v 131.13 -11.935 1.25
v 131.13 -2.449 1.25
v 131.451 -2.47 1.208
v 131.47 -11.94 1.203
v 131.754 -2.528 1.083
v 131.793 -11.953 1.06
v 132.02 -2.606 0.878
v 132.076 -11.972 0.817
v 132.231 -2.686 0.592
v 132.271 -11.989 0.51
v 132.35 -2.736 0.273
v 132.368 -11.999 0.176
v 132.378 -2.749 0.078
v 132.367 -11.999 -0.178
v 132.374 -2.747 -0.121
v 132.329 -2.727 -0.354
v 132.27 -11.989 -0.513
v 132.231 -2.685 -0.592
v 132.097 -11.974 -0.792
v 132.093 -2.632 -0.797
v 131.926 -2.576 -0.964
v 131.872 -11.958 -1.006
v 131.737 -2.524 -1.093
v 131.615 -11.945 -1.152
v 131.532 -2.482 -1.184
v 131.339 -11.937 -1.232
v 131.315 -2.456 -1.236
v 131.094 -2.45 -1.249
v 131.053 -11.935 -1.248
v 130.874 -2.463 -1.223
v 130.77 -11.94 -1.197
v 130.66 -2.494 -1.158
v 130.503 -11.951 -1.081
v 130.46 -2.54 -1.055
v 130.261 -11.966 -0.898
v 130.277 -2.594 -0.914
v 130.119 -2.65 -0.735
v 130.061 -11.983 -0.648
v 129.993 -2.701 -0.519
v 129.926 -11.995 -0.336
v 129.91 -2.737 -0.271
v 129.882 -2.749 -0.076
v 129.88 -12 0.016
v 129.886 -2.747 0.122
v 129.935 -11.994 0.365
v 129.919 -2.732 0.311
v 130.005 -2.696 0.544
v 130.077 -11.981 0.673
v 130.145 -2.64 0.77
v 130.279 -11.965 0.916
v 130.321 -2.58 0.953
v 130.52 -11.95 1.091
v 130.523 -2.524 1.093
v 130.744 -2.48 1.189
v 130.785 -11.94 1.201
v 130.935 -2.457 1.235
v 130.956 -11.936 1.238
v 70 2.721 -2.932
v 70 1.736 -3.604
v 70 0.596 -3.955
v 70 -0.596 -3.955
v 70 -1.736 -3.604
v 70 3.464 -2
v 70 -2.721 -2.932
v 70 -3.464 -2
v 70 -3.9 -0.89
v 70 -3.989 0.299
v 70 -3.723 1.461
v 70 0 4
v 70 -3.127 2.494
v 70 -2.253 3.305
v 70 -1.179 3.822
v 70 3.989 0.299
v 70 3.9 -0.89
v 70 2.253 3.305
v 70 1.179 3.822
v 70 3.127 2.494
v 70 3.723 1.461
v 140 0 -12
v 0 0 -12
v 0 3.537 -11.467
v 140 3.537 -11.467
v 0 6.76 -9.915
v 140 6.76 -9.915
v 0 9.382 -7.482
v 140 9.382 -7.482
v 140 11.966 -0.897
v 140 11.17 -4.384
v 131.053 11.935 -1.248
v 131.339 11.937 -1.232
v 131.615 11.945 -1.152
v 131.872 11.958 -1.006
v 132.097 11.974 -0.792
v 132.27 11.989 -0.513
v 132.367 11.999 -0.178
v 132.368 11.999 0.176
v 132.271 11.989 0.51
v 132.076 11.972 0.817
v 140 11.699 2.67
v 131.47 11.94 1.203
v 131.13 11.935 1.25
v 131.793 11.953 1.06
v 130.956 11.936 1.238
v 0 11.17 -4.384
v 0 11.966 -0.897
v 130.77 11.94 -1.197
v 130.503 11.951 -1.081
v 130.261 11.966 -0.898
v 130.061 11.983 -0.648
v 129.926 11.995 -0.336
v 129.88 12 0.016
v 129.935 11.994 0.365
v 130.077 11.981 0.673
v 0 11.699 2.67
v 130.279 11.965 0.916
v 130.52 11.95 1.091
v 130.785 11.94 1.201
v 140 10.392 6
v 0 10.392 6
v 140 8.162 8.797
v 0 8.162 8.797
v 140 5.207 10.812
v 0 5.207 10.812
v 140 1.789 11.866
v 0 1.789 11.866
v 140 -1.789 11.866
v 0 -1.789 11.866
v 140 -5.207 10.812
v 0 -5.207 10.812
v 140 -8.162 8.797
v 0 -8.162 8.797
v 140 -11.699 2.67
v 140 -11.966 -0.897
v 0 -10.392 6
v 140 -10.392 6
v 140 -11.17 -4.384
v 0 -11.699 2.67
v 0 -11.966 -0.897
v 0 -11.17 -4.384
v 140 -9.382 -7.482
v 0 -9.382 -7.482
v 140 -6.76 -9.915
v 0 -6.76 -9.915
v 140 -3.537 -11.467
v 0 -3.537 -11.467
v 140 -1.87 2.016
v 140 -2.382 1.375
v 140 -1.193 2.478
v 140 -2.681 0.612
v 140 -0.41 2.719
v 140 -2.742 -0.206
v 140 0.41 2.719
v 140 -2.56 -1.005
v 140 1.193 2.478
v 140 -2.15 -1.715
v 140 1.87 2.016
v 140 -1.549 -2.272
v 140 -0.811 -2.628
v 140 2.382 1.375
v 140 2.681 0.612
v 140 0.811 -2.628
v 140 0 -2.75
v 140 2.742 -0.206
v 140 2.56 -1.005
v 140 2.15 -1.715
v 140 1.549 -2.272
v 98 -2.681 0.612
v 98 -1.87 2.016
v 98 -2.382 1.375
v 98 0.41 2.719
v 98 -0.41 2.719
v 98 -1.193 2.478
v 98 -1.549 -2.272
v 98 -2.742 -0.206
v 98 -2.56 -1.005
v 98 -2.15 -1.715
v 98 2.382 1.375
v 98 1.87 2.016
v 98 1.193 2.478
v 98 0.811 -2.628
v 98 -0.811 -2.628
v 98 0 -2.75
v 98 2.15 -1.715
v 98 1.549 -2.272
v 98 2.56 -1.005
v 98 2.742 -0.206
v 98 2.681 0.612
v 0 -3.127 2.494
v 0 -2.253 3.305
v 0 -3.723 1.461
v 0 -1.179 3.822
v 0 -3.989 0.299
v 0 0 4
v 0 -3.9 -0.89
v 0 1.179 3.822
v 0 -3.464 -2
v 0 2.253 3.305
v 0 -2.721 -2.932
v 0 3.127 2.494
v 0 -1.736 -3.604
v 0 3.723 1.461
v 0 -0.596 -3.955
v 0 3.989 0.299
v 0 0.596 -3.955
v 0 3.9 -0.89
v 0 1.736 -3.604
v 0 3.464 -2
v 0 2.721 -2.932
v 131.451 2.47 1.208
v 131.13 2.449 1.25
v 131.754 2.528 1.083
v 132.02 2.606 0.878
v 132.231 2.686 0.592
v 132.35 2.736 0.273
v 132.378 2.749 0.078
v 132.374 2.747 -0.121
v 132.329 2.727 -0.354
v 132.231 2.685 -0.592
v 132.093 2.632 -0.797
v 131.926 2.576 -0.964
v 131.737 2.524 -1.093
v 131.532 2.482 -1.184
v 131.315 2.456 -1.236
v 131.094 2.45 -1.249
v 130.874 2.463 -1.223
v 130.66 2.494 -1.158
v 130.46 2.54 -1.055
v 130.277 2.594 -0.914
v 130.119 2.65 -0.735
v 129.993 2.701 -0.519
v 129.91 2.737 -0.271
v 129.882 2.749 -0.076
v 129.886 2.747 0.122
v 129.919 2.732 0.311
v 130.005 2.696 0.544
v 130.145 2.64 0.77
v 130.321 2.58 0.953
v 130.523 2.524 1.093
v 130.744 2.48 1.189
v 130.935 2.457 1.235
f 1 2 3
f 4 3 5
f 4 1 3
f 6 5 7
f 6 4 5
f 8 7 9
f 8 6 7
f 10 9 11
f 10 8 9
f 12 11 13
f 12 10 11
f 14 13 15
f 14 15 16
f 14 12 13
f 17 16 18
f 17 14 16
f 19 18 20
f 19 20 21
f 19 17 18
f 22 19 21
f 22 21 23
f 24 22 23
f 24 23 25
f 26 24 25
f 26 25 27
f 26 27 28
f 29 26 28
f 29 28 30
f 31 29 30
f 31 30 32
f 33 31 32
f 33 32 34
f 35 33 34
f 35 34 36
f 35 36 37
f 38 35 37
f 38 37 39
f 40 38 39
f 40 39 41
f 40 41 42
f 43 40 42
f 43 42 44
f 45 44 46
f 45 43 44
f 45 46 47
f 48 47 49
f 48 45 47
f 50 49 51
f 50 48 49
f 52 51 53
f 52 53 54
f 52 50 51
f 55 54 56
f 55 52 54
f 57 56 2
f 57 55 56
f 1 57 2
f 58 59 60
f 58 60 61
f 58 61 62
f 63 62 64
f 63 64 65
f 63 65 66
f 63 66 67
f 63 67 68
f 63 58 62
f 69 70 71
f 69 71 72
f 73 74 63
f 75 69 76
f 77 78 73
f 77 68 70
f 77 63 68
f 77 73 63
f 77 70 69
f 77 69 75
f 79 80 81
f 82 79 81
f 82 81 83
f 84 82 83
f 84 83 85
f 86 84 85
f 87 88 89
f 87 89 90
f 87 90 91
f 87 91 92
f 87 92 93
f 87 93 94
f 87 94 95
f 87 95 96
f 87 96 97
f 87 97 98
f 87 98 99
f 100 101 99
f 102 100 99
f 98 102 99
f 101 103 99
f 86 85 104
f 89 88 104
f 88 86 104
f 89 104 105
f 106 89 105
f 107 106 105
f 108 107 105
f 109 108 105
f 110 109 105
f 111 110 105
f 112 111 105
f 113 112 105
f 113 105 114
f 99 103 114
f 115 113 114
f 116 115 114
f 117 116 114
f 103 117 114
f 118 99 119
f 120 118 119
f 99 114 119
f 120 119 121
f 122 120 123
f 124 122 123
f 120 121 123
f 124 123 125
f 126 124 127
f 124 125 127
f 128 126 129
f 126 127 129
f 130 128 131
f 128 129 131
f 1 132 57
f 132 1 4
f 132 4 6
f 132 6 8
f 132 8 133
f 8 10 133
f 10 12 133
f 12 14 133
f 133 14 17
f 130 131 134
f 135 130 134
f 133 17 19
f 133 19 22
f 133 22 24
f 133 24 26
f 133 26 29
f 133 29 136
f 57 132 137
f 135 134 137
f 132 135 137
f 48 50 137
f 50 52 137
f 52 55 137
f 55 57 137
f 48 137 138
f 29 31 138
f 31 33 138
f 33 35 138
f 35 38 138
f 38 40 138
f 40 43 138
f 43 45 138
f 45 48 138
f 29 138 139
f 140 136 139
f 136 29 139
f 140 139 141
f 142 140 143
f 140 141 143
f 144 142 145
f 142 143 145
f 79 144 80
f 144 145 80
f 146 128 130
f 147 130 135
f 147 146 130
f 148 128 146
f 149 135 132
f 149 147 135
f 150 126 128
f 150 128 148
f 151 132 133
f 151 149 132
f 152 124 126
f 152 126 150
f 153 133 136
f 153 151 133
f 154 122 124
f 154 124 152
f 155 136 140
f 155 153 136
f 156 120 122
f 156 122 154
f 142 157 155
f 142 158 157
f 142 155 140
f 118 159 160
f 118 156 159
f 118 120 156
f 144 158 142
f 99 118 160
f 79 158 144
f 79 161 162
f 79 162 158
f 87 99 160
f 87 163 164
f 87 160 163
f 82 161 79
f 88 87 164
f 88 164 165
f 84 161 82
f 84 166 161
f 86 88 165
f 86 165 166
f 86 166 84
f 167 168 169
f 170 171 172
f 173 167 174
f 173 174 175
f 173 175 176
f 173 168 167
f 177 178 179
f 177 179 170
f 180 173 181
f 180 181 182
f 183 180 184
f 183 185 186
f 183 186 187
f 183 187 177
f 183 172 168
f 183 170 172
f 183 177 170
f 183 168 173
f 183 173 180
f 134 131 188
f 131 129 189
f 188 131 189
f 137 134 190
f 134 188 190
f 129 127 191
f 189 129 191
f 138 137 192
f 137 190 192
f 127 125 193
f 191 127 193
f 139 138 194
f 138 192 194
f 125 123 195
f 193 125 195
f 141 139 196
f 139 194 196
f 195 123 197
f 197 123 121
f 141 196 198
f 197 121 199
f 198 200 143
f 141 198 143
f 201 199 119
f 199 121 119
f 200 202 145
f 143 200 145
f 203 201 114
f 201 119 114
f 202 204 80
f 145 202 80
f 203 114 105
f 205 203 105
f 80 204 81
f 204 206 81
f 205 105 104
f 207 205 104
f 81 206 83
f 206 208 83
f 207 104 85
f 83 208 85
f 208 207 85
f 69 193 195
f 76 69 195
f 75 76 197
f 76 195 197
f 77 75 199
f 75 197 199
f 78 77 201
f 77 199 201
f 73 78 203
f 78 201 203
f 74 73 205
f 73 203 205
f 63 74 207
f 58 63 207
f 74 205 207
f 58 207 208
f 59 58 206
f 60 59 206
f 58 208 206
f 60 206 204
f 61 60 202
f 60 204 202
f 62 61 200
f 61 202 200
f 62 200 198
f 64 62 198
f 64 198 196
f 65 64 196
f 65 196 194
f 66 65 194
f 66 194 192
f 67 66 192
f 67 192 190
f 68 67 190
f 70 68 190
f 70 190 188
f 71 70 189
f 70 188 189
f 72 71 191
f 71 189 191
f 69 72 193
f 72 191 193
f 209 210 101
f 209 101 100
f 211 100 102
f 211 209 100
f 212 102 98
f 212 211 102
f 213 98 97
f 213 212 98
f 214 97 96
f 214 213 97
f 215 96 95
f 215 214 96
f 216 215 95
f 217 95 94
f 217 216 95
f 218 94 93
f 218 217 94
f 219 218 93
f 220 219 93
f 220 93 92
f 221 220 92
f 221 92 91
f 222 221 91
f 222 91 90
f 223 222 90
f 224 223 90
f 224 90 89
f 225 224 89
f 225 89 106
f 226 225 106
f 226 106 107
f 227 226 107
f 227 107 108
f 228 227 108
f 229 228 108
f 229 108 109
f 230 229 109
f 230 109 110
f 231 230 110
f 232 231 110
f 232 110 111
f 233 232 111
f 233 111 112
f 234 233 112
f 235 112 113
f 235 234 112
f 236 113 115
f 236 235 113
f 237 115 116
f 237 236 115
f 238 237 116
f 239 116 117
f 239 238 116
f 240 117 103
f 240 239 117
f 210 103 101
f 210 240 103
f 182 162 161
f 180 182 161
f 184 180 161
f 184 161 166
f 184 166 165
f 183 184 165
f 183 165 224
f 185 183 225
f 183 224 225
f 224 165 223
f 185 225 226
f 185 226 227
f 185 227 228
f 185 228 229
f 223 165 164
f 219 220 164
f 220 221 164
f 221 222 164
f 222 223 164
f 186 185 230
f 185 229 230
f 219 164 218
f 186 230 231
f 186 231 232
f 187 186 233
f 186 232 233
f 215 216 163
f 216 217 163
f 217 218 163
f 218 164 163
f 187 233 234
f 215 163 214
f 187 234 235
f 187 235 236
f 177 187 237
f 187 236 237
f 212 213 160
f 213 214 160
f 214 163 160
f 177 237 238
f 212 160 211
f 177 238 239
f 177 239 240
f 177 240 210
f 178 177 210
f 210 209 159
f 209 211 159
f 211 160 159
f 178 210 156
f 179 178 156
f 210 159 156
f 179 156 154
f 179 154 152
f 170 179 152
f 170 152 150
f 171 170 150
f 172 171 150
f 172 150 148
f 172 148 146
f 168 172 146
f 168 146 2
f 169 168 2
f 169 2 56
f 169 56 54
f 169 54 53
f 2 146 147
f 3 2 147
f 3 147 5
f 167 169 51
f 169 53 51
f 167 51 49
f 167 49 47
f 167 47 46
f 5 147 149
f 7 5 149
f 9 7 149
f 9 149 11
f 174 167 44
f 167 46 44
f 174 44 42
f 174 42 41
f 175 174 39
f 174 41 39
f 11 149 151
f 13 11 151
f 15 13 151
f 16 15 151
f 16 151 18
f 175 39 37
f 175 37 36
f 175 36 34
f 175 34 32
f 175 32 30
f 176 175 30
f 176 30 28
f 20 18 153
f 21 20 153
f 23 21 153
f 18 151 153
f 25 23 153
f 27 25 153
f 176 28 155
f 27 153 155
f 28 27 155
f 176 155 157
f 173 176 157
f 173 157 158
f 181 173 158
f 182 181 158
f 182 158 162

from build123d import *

# Parameters (mm, degrees)
SKETCH1_R               = 12
BOSS_EXTRUDE1_DEPTH     = 140
CUT_EXTRUDE1_DEPTH      = 120
CUT_EXTRUDE1_DEPTH_BACK = 120
SKETCH2_R               = 1.25
SKETCH3_R               = 2.75
CUT_EXTRUDE2_DEPTH      = 42
SKETCH4_R               = 4
CUT_EXTRUDE3_DEPTH      = 70


with BuildPart() as part:
    # Sketch1 → Boss-Extrude1 (new body)
    with BuildSketch(Plane(origin=(0, 0, 0), x_dir=(0, 0, -1), z_dir=(1, 0, 0))):
        Circle(SKETCH1_R)
    extrude(amount=BOSS_EXTRUDE1_DEPTH)

    # Sketch2 → Cut-Extrude1 (cut, two sides: drawn at the far end of the back side and taken through both)
    with BuildSketch(Plane(origin=(0, 0, 0), x_dir=(1, 0, 0), z_dir=(0, 1, 0)).offset(-CUT_EXTRUDE1_DEPTH_BACK)):
        with Locations((131.130079525, 0)):
            Circle(SKETCH2_R)
    extrude(amount=CUT_EXTRUDE1_DEPTH + CUT_EXTRUDE1_DEPTH_BACK, mode=Mode.SUBTRACT)

    # Sketch3 → Cut-Extrude2 (cut)
    with BuildSketch(Plane(origin=(140, 0, 0), x_dir=(0, 0, -1), z_dir=(1, 0, 0))):
        Circle(SKETCH3_R)
    extrude(amount=-CUT_EXTRUDE2_DEPTH, mode=Mode.SUBTRACT)

    # Sketch4 → Cut-Extrude3 (cut)
    with BuildSketch(Plane.ZY):
        Circle(SKETCH4_R)
    extrude(amount=-CUT_EXTRUDE3_DEPTH, mode=Mode.SUBTRACT)


solid = part.part
